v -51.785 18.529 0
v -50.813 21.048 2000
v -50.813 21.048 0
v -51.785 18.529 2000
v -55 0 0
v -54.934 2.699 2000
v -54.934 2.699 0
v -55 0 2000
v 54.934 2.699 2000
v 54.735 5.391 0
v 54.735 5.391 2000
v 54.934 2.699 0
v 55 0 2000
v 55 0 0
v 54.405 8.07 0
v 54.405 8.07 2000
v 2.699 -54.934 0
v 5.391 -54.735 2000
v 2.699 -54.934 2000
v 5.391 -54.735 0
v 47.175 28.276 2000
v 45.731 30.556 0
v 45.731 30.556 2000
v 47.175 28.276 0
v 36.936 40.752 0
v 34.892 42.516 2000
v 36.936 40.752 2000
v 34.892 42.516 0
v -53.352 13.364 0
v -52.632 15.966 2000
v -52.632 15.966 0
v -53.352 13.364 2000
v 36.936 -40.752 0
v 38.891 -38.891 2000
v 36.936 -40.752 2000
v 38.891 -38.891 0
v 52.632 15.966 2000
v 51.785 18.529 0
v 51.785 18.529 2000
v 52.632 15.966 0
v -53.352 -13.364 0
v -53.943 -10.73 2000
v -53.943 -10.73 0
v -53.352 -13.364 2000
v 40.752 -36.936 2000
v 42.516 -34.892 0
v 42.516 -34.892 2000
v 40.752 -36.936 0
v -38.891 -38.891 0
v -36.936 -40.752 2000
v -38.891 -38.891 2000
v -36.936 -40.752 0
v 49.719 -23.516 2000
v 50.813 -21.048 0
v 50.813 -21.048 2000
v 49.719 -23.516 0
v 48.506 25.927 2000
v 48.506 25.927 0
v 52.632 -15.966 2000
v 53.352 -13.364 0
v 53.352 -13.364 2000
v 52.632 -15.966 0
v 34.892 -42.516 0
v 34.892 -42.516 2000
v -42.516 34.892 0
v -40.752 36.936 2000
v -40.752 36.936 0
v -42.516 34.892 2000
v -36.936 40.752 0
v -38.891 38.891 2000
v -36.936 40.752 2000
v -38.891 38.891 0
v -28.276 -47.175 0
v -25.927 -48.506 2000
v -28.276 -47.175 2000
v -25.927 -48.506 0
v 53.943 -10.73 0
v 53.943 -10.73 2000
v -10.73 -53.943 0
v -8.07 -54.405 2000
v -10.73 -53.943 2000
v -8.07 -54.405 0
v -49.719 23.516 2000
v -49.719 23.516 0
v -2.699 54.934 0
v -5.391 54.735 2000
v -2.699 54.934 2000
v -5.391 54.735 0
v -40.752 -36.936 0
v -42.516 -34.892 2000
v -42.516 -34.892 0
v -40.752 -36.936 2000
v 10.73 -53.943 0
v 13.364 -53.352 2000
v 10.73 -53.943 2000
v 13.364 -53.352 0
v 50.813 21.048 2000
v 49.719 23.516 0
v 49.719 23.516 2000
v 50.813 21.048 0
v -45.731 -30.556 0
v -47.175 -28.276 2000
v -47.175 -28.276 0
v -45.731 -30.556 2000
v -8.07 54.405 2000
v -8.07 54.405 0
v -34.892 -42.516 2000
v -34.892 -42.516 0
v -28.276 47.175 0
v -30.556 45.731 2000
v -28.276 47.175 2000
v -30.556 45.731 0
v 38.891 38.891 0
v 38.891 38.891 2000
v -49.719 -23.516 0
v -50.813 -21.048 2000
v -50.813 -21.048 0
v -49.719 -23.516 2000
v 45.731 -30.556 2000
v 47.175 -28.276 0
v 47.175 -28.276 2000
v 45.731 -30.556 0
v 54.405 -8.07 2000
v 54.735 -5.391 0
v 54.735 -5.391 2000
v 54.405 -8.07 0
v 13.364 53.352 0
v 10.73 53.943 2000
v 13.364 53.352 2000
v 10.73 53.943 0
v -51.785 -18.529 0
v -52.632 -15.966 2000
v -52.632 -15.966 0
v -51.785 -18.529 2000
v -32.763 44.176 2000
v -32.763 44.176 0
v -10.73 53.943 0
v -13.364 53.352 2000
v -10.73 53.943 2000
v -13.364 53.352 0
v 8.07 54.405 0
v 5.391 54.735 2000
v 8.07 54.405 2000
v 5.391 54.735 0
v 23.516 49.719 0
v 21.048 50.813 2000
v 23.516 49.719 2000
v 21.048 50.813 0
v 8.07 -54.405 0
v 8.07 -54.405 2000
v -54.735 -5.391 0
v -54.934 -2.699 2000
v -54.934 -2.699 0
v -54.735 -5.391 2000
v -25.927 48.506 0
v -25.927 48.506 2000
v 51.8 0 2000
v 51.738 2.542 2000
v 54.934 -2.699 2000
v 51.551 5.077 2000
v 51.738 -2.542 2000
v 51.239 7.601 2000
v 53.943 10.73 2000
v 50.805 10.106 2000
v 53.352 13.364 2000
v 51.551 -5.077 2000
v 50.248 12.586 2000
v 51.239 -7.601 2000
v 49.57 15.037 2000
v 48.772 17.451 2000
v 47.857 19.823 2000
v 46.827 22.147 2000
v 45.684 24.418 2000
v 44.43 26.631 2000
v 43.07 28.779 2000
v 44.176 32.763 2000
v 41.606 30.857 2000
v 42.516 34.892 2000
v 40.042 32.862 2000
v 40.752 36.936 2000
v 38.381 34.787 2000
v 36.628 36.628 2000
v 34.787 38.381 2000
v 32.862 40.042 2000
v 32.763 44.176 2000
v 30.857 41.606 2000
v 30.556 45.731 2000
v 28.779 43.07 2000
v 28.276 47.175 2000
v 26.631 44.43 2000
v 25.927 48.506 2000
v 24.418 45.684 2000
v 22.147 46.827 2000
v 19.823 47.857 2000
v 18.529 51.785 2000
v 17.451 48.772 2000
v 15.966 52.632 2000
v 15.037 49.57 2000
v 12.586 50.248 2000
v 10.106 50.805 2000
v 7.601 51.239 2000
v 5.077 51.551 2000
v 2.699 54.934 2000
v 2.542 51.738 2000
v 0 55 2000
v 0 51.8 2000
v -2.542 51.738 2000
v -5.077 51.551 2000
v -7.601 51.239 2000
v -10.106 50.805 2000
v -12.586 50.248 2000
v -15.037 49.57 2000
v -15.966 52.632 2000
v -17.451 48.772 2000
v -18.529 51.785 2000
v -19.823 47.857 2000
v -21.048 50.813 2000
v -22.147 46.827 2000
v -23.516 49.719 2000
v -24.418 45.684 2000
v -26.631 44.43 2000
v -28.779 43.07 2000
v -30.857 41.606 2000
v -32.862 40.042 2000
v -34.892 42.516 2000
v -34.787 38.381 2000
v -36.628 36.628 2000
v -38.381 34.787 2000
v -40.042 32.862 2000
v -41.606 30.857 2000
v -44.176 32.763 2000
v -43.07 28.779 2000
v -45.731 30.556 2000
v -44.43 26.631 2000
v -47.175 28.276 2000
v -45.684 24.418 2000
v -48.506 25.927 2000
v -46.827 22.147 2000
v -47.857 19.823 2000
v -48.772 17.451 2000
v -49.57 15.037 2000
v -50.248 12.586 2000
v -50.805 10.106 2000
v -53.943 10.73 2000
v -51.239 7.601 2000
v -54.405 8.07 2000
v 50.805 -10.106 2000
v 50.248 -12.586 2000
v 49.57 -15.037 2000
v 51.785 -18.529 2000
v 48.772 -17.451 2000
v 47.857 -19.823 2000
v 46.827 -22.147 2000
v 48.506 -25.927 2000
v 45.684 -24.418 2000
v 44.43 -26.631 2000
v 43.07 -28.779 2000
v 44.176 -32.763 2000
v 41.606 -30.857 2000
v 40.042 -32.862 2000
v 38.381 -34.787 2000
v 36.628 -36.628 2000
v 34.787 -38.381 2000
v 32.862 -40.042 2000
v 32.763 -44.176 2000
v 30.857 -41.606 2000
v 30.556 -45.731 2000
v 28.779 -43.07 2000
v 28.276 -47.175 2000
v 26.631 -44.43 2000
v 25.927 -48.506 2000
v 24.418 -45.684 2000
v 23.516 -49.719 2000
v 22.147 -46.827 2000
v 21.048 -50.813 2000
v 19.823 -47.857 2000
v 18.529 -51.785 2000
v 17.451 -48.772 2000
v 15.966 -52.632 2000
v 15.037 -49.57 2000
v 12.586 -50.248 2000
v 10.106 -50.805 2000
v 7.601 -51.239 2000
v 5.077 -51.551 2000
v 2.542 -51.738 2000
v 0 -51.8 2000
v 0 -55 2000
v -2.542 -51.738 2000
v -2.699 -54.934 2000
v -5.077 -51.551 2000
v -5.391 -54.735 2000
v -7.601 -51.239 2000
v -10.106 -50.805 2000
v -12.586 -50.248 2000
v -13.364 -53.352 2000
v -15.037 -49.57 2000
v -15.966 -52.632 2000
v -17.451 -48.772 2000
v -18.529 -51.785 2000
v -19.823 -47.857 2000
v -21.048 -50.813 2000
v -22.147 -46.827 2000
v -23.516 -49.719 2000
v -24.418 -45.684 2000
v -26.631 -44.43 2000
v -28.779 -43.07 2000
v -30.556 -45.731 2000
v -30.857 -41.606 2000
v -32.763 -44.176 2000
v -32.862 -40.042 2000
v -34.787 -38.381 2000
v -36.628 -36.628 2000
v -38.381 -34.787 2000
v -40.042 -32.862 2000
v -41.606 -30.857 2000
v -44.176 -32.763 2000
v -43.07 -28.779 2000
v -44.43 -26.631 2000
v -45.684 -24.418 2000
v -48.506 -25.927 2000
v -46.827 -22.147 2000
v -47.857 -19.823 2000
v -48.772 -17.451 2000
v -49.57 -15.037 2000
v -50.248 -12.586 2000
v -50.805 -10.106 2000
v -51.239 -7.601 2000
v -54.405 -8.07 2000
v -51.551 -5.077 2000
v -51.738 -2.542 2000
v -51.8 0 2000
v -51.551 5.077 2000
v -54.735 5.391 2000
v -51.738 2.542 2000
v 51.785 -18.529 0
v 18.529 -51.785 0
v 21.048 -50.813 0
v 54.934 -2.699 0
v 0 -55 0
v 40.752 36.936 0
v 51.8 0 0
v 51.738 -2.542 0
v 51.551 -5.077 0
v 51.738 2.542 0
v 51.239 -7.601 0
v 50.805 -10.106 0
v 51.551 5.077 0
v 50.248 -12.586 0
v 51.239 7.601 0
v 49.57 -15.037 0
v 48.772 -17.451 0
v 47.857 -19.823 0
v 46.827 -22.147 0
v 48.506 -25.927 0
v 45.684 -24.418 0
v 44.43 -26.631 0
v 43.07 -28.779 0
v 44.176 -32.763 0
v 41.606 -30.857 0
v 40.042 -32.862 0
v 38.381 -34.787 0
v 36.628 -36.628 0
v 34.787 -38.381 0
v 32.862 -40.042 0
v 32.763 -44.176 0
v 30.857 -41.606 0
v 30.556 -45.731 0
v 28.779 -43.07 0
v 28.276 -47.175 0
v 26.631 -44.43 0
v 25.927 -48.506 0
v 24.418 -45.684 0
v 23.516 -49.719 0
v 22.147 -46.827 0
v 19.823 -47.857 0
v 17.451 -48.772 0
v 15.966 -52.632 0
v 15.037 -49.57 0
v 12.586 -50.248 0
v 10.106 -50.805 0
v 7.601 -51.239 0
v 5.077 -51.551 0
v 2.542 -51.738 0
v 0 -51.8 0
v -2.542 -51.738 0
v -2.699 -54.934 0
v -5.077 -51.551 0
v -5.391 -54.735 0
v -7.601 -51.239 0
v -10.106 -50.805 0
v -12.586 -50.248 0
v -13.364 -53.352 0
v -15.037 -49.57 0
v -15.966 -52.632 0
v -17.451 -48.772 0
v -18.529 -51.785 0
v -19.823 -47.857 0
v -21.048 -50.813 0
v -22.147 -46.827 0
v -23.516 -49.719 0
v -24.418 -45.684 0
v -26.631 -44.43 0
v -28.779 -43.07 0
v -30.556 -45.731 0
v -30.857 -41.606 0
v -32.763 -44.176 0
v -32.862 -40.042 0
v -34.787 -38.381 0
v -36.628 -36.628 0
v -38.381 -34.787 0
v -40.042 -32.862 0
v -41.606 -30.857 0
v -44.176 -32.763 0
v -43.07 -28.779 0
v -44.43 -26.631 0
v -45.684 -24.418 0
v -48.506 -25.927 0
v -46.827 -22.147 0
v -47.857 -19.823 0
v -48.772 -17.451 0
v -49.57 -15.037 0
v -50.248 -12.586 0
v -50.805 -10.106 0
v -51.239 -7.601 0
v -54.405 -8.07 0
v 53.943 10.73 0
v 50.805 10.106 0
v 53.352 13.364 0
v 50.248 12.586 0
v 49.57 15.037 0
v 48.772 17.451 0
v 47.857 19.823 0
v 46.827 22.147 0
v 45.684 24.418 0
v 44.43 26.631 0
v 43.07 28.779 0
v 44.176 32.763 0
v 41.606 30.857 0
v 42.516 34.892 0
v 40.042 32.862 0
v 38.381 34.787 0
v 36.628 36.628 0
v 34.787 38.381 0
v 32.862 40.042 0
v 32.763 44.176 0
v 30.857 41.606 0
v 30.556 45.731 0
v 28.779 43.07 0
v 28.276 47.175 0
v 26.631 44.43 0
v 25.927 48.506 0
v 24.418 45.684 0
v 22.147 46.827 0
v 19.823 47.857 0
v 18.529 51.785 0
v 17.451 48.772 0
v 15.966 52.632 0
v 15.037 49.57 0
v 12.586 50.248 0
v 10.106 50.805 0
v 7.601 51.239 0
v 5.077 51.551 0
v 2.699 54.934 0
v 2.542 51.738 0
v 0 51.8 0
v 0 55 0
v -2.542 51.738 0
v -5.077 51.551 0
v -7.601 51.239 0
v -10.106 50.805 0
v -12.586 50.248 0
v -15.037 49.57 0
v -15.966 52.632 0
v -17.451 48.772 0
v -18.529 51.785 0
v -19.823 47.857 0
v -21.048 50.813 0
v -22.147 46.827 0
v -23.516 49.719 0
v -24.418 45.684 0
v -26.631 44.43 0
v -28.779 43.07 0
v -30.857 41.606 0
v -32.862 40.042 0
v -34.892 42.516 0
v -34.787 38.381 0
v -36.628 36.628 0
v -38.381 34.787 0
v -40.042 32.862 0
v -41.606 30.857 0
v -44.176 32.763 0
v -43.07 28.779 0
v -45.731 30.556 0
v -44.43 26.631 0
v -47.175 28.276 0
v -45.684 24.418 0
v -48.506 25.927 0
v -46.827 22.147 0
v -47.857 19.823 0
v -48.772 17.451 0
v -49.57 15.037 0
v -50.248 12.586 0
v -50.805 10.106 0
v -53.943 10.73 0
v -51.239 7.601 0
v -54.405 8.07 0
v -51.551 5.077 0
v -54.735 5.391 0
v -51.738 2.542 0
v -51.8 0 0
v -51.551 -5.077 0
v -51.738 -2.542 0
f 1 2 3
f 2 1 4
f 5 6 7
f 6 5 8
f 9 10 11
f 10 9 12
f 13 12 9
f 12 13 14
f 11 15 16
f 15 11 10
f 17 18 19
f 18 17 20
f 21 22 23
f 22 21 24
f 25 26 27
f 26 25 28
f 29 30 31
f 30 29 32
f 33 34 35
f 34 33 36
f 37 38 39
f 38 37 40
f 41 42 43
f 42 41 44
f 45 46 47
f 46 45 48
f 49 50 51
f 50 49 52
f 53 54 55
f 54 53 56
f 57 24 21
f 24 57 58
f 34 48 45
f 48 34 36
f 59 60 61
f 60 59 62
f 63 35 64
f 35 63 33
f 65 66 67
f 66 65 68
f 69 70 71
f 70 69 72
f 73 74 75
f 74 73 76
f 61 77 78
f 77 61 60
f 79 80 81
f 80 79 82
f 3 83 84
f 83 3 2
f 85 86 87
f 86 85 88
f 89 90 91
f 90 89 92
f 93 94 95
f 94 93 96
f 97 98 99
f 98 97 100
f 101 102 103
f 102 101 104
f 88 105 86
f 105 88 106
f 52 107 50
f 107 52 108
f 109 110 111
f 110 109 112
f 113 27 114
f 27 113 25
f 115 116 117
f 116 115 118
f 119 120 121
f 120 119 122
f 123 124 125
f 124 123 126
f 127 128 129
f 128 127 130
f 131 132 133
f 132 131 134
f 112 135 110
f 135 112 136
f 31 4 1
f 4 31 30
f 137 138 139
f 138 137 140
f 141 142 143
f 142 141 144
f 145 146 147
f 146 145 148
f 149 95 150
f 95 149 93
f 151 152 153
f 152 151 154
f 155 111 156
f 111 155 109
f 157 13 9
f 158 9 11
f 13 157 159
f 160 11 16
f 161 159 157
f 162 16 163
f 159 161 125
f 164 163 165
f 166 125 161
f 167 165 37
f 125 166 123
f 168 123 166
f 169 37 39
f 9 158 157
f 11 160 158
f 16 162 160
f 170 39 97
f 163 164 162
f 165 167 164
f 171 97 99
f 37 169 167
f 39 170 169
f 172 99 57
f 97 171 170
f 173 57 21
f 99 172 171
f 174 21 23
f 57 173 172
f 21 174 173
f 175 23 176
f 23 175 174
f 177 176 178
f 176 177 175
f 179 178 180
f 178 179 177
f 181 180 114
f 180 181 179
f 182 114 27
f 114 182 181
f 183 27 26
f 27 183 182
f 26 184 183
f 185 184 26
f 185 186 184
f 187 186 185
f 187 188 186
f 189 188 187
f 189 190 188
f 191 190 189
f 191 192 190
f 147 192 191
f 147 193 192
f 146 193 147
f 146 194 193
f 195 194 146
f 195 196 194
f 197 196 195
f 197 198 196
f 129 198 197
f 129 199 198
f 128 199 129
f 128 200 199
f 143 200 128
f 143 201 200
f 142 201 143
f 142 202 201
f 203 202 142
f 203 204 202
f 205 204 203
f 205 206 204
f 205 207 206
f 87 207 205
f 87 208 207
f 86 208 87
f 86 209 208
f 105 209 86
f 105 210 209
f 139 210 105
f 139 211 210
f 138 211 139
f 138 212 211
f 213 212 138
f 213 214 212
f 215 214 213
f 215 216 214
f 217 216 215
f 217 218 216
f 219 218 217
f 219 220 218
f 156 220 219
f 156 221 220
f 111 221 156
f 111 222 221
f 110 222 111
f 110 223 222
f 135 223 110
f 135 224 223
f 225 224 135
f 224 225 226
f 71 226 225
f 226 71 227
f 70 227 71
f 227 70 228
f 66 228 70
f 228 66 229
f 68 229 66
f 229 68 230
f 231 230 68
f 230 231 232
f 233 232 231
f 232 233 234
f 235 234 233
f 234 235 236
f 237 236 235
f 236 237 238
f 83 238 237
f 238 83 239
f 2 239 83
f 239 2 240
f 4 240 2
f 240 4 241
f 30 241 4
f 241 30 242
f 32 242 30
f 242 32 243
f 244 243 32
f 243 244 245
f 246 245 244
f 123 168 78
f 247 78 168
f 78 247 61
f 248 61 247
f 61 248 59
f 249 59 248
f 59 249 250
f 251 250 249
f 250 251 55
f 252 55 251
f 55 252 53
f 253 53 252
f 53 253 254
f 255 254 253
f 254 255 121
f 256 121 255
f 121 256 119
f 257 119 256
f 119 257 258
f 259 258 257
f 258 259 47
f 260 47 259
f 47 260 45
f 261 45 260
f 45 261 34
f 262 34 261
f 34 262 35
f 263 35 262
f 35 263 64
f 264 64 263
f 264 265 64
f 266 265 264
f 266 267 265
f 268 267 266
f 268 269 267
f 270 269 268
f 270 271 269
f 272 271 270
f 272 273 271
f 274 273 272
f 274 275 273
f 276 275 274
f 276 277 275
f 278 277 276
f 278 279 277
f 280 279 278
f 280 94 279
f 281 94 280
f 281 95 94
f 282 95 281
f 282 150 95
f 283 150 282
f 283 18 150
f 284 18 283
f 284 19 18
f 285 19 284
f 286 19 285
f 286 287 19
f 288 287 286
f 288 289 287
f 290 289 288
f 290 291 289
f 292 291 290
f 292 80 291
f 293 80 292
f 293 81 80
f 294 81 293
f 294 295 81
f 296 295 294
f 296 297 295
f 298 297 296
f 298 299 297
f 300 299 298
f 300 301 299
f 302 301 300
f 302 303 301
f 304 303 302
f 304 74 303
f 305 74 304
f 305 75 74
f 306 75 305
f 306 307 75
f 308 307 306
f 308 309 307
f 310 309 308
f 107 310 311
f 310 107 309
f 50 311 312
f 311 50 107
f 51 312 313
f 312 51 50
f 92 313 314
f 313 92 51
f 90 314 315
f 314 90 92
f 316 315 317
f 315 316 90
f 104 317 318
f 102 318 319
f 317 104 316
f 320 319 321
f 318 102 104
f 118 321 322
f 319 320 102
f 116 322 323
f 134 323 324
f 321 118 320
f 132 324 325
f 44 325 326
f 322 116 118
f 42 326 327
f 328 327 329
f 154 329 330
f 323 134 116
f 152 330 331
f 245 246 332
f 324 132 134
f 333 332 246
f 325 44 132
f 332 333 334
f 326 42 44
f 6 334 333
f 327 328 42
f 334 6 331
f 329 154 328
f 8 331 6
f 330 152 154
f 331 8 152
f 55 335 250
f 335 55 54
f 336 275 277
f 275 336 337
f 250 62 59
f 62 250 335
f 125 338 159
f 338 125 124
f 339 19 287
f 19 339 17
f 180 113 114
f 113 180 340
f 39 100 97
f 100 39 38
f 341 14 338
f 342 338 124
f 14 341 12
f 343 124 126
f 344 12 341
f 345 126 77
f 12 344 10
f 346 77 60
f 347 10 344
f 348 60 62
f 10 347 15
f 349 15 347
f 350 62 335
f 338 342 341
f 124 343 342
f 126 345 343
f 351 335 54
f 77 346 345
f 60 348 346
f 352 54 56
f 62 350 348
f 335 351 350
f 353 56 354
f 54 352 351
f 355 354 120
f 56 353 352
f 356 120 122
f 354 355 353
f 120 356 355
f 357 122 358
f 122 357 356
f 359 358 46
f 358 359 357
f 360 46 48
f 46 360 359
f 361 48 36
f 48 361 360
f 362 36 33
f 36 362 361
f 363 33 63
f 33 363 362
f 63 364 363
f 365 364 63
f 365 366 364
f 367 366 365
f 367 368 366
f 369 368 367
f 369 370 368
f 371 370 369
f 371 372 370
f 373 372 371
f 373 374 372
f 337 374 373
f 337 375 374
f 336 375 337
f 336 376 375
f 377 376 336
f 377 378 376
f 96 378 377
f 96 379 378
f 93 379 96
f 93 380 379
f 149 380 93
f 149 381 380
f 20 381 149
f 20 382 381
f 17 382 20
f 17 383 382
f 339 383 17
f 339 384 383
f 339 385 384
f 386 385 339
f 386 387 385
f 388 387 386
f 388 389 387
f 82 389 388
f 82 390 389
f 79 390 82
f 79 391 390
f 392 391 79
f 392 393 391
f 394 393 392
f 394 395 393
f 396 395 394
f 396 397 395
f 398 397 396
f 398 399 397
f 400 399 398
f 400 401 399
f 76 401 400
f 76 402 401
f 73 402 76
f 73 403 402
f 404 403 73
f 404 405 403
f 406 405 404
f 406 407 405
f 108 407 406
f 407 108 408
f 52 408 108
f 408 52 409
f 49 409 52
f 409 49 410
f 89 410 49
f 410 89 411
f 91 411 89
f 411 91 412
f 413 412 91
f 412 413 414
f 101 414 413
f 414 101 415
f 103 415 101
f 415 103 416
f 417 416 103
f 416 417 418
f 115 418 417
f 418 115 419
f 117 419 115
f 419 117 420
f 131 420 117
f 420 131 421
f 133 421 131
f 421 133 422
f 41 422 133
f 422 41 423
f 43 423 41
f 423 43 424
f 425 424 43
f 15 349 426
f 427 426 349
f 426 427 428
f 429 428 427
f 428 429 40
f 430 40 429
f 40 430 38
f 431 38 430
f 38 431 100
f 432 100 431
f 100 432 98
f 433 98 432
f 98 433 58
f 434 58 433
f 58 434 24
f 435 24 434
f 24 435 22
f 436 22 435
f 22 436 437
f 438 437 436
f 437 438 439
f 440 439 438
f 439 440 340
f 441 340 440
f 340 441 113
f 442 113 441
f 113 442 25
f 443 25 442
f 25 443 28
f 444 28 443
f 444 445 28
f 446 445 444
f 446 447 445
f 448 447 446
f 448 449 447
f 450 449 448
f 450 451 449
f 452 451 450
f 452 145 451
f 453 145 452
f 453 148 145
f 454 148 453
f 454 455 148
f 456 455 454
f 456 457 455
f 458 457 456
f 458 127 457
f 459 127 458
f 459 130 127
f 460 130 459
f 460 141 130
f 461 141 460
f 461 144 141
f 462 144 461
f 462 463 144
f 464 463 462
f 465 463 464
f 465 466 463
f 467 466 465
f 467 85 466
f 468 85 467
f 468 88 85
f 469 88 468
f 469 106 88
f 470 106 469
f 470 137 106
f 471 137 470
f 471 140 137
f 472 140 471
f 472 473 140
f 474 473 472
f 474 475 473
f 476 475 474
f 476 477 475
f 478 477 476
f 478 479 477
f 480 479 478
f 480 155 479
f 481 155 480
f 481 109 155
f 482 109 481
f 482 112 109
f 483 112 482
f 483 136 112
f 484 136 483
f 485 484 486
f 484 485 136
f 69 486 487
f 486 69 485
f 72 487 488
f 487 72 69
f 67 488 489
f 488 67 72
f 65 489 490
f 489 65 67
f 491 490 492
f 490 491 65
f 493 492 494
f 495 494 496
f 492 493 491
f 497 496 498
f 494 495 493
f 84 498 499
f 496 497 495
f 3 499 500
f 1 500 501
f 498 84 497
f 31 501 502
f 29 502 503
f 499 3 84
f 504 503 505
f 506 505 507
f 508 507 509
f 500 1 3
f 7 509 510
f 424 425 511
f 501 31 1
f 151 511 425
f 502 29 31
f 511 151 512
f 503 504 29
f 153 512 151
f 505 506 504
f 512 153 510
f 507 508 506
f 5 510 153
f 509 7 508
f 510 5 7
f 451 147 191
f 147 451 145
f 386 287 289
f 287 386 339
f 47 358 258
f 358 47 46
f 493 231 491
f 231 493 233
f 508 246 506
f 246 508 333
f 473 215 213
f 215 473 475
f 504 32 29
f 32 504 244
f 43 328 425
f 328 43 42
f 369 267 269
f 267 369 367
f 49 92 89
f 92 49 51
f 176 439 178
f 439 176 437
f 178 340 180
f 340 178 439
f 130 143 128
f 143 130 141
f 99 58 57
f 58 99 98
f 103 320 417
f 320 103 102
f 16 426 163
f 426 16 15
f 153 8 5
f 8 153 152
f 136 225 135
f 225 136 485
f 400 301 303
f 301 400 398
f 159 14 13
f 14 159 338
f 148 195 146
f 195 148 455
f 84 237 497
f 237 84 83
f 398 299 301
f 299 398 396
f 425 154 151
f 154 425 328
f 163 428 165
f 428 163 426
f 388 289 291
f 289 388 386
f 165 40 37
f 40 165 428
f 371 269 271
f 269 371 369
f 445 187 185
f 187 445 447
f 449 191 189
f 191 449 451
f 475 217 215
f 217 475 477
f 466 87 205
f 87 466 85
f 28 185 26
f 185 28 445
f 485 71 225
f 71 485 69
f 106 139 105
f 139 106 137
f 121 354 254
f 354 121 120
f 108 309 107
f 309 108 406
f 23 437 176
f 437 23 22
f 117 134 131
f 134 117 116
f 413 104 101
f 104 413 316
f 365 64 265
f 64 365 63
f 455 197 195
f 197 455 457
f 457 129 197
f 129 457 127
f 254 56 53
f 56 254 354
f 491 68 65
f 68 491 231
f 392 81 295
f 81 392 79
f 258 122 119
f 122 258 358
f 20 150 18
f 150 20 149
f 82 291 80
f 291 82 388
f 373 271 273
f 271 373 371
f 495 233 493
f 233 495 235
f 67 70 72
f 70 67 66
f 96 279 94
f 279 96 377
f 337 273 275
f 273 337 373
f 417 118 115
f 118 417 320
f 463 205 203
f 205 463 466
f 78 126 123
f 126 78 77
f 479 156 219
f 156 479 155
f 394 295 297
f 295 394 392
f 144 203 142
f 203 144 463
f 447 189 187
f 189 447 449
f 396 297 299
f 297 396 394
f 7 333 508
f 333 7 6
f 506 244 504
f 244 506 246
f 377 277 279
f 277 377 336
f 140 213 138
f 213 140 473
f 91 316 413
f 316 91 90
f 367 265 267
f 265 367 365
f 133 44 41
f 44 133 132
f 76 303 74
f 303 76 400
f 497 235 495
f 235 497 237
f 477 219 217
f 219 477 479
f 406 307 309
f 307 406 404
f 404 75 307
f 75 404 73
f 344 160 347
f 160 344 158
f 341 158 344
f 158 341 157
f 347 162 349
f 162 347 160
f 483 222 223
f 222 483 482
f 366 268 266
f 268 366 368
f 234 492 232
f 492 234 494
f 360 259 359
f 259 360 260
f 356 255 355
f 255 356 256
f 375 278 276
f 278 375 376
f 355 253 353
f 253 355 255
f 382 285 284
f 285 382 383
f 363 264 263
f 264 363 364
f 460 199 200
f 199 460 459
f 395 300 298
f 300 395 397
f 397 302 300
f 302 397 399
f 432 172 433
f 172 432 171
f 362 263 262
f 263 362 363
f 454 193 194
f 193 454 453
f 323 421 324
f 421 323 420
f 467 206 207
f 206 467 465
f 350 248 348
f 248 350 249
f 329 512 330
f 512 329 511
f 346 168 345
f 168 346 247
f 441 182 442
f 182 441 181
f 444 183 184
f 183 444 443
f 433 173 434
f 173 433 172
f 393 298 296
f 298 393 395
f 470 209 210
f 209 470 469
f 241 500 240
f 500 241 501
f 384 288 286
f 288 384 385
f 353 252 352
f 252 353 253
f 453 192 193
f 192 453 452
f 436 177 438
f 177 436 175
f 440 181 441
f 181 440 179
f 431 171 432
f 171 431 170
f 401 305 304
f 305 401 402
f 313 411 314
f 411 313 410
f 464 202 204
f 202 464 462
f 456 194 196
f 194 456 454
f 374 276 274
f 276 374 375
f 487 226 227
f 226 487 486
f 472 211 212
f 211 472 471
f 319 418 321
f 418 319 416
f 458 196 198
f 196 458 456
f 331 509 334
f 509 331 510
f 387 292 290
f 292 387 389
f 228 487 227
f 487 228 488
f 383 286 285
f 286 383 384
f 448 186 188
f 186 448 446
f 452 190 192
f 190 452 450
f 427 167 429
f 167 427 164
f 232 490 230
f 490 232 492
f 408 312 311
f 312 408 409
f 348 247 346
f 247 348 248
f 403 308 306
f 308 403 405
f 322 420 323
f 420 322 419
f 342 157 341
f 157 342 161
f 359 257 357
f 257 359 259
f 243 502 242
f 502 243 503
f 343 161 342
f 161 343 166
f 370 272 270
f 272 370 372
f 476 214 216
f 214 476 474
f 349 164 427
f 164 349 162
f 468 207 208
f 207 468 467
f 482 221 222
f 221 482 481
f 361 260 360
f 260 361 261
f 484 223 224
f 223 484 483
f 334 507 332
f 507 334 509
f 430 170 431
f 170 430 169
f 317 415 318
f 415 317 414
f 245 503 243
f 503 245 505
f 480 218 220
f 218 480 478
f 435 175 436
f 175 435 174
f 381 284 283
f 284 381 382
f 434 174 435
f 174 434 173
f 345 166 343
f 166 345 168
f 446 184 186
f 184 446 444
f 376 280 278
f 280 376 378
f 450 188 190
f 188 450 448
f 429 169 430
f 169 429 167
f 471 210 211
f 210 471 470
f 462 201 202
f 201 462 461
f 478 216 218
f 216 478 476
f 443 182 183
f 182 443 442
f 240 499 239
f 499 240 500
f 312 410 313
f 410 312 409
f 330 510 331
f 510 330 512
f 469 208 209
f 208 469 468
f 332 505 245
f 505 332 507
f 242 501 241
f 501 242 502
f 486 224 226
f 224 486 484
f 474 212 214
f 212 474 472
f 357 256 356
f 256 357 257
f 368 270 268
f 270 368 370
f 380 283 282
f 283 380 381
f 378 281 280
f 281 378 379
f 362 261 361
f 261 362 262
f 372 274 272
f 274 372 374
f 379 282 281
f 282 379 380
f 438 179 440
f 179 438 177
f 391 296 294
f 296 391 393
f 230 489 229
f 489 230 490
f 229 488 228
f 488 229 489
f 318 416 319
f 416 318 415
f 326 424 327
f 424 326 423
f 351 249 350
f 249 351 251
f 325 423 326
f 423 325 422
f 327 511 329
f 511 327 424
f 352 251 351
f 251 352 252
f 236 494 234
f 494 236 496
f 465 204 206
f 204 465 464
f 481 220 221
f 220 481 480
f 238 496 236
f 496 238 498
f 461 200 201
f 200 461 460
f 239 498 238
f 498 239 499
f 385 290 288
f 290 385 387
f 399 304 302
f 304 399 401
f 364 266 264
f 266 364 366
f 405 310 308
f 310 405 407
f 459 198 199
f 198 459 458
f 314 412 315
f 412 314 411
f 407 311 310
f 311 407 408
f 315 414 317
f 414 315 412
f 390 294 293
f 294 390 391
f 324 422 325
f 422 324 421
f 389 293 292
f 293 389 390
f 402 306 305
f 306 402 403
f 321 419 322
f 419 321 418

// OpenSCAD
$fn = 128;

// HT pipe parameters (approximate for HT 110)
pipe_length = 2000;      // mm
outer_diameter = 110;    // mm
wall_thickness = 3.2;    // mm (typical for HT 110)
inner_diameter = outer_diameter - 2 * wall_thickness;

module ht_pipe(od, id, len) {
    difference() {
        cylinder(h = len, d = od, center = false);
        translate([0, 0, -0.5])
            cylinder(h = len + 1, d = id, center = false);
    }
}

ht_pipe(outer_diameter, inner_diameter, pipe_length);
